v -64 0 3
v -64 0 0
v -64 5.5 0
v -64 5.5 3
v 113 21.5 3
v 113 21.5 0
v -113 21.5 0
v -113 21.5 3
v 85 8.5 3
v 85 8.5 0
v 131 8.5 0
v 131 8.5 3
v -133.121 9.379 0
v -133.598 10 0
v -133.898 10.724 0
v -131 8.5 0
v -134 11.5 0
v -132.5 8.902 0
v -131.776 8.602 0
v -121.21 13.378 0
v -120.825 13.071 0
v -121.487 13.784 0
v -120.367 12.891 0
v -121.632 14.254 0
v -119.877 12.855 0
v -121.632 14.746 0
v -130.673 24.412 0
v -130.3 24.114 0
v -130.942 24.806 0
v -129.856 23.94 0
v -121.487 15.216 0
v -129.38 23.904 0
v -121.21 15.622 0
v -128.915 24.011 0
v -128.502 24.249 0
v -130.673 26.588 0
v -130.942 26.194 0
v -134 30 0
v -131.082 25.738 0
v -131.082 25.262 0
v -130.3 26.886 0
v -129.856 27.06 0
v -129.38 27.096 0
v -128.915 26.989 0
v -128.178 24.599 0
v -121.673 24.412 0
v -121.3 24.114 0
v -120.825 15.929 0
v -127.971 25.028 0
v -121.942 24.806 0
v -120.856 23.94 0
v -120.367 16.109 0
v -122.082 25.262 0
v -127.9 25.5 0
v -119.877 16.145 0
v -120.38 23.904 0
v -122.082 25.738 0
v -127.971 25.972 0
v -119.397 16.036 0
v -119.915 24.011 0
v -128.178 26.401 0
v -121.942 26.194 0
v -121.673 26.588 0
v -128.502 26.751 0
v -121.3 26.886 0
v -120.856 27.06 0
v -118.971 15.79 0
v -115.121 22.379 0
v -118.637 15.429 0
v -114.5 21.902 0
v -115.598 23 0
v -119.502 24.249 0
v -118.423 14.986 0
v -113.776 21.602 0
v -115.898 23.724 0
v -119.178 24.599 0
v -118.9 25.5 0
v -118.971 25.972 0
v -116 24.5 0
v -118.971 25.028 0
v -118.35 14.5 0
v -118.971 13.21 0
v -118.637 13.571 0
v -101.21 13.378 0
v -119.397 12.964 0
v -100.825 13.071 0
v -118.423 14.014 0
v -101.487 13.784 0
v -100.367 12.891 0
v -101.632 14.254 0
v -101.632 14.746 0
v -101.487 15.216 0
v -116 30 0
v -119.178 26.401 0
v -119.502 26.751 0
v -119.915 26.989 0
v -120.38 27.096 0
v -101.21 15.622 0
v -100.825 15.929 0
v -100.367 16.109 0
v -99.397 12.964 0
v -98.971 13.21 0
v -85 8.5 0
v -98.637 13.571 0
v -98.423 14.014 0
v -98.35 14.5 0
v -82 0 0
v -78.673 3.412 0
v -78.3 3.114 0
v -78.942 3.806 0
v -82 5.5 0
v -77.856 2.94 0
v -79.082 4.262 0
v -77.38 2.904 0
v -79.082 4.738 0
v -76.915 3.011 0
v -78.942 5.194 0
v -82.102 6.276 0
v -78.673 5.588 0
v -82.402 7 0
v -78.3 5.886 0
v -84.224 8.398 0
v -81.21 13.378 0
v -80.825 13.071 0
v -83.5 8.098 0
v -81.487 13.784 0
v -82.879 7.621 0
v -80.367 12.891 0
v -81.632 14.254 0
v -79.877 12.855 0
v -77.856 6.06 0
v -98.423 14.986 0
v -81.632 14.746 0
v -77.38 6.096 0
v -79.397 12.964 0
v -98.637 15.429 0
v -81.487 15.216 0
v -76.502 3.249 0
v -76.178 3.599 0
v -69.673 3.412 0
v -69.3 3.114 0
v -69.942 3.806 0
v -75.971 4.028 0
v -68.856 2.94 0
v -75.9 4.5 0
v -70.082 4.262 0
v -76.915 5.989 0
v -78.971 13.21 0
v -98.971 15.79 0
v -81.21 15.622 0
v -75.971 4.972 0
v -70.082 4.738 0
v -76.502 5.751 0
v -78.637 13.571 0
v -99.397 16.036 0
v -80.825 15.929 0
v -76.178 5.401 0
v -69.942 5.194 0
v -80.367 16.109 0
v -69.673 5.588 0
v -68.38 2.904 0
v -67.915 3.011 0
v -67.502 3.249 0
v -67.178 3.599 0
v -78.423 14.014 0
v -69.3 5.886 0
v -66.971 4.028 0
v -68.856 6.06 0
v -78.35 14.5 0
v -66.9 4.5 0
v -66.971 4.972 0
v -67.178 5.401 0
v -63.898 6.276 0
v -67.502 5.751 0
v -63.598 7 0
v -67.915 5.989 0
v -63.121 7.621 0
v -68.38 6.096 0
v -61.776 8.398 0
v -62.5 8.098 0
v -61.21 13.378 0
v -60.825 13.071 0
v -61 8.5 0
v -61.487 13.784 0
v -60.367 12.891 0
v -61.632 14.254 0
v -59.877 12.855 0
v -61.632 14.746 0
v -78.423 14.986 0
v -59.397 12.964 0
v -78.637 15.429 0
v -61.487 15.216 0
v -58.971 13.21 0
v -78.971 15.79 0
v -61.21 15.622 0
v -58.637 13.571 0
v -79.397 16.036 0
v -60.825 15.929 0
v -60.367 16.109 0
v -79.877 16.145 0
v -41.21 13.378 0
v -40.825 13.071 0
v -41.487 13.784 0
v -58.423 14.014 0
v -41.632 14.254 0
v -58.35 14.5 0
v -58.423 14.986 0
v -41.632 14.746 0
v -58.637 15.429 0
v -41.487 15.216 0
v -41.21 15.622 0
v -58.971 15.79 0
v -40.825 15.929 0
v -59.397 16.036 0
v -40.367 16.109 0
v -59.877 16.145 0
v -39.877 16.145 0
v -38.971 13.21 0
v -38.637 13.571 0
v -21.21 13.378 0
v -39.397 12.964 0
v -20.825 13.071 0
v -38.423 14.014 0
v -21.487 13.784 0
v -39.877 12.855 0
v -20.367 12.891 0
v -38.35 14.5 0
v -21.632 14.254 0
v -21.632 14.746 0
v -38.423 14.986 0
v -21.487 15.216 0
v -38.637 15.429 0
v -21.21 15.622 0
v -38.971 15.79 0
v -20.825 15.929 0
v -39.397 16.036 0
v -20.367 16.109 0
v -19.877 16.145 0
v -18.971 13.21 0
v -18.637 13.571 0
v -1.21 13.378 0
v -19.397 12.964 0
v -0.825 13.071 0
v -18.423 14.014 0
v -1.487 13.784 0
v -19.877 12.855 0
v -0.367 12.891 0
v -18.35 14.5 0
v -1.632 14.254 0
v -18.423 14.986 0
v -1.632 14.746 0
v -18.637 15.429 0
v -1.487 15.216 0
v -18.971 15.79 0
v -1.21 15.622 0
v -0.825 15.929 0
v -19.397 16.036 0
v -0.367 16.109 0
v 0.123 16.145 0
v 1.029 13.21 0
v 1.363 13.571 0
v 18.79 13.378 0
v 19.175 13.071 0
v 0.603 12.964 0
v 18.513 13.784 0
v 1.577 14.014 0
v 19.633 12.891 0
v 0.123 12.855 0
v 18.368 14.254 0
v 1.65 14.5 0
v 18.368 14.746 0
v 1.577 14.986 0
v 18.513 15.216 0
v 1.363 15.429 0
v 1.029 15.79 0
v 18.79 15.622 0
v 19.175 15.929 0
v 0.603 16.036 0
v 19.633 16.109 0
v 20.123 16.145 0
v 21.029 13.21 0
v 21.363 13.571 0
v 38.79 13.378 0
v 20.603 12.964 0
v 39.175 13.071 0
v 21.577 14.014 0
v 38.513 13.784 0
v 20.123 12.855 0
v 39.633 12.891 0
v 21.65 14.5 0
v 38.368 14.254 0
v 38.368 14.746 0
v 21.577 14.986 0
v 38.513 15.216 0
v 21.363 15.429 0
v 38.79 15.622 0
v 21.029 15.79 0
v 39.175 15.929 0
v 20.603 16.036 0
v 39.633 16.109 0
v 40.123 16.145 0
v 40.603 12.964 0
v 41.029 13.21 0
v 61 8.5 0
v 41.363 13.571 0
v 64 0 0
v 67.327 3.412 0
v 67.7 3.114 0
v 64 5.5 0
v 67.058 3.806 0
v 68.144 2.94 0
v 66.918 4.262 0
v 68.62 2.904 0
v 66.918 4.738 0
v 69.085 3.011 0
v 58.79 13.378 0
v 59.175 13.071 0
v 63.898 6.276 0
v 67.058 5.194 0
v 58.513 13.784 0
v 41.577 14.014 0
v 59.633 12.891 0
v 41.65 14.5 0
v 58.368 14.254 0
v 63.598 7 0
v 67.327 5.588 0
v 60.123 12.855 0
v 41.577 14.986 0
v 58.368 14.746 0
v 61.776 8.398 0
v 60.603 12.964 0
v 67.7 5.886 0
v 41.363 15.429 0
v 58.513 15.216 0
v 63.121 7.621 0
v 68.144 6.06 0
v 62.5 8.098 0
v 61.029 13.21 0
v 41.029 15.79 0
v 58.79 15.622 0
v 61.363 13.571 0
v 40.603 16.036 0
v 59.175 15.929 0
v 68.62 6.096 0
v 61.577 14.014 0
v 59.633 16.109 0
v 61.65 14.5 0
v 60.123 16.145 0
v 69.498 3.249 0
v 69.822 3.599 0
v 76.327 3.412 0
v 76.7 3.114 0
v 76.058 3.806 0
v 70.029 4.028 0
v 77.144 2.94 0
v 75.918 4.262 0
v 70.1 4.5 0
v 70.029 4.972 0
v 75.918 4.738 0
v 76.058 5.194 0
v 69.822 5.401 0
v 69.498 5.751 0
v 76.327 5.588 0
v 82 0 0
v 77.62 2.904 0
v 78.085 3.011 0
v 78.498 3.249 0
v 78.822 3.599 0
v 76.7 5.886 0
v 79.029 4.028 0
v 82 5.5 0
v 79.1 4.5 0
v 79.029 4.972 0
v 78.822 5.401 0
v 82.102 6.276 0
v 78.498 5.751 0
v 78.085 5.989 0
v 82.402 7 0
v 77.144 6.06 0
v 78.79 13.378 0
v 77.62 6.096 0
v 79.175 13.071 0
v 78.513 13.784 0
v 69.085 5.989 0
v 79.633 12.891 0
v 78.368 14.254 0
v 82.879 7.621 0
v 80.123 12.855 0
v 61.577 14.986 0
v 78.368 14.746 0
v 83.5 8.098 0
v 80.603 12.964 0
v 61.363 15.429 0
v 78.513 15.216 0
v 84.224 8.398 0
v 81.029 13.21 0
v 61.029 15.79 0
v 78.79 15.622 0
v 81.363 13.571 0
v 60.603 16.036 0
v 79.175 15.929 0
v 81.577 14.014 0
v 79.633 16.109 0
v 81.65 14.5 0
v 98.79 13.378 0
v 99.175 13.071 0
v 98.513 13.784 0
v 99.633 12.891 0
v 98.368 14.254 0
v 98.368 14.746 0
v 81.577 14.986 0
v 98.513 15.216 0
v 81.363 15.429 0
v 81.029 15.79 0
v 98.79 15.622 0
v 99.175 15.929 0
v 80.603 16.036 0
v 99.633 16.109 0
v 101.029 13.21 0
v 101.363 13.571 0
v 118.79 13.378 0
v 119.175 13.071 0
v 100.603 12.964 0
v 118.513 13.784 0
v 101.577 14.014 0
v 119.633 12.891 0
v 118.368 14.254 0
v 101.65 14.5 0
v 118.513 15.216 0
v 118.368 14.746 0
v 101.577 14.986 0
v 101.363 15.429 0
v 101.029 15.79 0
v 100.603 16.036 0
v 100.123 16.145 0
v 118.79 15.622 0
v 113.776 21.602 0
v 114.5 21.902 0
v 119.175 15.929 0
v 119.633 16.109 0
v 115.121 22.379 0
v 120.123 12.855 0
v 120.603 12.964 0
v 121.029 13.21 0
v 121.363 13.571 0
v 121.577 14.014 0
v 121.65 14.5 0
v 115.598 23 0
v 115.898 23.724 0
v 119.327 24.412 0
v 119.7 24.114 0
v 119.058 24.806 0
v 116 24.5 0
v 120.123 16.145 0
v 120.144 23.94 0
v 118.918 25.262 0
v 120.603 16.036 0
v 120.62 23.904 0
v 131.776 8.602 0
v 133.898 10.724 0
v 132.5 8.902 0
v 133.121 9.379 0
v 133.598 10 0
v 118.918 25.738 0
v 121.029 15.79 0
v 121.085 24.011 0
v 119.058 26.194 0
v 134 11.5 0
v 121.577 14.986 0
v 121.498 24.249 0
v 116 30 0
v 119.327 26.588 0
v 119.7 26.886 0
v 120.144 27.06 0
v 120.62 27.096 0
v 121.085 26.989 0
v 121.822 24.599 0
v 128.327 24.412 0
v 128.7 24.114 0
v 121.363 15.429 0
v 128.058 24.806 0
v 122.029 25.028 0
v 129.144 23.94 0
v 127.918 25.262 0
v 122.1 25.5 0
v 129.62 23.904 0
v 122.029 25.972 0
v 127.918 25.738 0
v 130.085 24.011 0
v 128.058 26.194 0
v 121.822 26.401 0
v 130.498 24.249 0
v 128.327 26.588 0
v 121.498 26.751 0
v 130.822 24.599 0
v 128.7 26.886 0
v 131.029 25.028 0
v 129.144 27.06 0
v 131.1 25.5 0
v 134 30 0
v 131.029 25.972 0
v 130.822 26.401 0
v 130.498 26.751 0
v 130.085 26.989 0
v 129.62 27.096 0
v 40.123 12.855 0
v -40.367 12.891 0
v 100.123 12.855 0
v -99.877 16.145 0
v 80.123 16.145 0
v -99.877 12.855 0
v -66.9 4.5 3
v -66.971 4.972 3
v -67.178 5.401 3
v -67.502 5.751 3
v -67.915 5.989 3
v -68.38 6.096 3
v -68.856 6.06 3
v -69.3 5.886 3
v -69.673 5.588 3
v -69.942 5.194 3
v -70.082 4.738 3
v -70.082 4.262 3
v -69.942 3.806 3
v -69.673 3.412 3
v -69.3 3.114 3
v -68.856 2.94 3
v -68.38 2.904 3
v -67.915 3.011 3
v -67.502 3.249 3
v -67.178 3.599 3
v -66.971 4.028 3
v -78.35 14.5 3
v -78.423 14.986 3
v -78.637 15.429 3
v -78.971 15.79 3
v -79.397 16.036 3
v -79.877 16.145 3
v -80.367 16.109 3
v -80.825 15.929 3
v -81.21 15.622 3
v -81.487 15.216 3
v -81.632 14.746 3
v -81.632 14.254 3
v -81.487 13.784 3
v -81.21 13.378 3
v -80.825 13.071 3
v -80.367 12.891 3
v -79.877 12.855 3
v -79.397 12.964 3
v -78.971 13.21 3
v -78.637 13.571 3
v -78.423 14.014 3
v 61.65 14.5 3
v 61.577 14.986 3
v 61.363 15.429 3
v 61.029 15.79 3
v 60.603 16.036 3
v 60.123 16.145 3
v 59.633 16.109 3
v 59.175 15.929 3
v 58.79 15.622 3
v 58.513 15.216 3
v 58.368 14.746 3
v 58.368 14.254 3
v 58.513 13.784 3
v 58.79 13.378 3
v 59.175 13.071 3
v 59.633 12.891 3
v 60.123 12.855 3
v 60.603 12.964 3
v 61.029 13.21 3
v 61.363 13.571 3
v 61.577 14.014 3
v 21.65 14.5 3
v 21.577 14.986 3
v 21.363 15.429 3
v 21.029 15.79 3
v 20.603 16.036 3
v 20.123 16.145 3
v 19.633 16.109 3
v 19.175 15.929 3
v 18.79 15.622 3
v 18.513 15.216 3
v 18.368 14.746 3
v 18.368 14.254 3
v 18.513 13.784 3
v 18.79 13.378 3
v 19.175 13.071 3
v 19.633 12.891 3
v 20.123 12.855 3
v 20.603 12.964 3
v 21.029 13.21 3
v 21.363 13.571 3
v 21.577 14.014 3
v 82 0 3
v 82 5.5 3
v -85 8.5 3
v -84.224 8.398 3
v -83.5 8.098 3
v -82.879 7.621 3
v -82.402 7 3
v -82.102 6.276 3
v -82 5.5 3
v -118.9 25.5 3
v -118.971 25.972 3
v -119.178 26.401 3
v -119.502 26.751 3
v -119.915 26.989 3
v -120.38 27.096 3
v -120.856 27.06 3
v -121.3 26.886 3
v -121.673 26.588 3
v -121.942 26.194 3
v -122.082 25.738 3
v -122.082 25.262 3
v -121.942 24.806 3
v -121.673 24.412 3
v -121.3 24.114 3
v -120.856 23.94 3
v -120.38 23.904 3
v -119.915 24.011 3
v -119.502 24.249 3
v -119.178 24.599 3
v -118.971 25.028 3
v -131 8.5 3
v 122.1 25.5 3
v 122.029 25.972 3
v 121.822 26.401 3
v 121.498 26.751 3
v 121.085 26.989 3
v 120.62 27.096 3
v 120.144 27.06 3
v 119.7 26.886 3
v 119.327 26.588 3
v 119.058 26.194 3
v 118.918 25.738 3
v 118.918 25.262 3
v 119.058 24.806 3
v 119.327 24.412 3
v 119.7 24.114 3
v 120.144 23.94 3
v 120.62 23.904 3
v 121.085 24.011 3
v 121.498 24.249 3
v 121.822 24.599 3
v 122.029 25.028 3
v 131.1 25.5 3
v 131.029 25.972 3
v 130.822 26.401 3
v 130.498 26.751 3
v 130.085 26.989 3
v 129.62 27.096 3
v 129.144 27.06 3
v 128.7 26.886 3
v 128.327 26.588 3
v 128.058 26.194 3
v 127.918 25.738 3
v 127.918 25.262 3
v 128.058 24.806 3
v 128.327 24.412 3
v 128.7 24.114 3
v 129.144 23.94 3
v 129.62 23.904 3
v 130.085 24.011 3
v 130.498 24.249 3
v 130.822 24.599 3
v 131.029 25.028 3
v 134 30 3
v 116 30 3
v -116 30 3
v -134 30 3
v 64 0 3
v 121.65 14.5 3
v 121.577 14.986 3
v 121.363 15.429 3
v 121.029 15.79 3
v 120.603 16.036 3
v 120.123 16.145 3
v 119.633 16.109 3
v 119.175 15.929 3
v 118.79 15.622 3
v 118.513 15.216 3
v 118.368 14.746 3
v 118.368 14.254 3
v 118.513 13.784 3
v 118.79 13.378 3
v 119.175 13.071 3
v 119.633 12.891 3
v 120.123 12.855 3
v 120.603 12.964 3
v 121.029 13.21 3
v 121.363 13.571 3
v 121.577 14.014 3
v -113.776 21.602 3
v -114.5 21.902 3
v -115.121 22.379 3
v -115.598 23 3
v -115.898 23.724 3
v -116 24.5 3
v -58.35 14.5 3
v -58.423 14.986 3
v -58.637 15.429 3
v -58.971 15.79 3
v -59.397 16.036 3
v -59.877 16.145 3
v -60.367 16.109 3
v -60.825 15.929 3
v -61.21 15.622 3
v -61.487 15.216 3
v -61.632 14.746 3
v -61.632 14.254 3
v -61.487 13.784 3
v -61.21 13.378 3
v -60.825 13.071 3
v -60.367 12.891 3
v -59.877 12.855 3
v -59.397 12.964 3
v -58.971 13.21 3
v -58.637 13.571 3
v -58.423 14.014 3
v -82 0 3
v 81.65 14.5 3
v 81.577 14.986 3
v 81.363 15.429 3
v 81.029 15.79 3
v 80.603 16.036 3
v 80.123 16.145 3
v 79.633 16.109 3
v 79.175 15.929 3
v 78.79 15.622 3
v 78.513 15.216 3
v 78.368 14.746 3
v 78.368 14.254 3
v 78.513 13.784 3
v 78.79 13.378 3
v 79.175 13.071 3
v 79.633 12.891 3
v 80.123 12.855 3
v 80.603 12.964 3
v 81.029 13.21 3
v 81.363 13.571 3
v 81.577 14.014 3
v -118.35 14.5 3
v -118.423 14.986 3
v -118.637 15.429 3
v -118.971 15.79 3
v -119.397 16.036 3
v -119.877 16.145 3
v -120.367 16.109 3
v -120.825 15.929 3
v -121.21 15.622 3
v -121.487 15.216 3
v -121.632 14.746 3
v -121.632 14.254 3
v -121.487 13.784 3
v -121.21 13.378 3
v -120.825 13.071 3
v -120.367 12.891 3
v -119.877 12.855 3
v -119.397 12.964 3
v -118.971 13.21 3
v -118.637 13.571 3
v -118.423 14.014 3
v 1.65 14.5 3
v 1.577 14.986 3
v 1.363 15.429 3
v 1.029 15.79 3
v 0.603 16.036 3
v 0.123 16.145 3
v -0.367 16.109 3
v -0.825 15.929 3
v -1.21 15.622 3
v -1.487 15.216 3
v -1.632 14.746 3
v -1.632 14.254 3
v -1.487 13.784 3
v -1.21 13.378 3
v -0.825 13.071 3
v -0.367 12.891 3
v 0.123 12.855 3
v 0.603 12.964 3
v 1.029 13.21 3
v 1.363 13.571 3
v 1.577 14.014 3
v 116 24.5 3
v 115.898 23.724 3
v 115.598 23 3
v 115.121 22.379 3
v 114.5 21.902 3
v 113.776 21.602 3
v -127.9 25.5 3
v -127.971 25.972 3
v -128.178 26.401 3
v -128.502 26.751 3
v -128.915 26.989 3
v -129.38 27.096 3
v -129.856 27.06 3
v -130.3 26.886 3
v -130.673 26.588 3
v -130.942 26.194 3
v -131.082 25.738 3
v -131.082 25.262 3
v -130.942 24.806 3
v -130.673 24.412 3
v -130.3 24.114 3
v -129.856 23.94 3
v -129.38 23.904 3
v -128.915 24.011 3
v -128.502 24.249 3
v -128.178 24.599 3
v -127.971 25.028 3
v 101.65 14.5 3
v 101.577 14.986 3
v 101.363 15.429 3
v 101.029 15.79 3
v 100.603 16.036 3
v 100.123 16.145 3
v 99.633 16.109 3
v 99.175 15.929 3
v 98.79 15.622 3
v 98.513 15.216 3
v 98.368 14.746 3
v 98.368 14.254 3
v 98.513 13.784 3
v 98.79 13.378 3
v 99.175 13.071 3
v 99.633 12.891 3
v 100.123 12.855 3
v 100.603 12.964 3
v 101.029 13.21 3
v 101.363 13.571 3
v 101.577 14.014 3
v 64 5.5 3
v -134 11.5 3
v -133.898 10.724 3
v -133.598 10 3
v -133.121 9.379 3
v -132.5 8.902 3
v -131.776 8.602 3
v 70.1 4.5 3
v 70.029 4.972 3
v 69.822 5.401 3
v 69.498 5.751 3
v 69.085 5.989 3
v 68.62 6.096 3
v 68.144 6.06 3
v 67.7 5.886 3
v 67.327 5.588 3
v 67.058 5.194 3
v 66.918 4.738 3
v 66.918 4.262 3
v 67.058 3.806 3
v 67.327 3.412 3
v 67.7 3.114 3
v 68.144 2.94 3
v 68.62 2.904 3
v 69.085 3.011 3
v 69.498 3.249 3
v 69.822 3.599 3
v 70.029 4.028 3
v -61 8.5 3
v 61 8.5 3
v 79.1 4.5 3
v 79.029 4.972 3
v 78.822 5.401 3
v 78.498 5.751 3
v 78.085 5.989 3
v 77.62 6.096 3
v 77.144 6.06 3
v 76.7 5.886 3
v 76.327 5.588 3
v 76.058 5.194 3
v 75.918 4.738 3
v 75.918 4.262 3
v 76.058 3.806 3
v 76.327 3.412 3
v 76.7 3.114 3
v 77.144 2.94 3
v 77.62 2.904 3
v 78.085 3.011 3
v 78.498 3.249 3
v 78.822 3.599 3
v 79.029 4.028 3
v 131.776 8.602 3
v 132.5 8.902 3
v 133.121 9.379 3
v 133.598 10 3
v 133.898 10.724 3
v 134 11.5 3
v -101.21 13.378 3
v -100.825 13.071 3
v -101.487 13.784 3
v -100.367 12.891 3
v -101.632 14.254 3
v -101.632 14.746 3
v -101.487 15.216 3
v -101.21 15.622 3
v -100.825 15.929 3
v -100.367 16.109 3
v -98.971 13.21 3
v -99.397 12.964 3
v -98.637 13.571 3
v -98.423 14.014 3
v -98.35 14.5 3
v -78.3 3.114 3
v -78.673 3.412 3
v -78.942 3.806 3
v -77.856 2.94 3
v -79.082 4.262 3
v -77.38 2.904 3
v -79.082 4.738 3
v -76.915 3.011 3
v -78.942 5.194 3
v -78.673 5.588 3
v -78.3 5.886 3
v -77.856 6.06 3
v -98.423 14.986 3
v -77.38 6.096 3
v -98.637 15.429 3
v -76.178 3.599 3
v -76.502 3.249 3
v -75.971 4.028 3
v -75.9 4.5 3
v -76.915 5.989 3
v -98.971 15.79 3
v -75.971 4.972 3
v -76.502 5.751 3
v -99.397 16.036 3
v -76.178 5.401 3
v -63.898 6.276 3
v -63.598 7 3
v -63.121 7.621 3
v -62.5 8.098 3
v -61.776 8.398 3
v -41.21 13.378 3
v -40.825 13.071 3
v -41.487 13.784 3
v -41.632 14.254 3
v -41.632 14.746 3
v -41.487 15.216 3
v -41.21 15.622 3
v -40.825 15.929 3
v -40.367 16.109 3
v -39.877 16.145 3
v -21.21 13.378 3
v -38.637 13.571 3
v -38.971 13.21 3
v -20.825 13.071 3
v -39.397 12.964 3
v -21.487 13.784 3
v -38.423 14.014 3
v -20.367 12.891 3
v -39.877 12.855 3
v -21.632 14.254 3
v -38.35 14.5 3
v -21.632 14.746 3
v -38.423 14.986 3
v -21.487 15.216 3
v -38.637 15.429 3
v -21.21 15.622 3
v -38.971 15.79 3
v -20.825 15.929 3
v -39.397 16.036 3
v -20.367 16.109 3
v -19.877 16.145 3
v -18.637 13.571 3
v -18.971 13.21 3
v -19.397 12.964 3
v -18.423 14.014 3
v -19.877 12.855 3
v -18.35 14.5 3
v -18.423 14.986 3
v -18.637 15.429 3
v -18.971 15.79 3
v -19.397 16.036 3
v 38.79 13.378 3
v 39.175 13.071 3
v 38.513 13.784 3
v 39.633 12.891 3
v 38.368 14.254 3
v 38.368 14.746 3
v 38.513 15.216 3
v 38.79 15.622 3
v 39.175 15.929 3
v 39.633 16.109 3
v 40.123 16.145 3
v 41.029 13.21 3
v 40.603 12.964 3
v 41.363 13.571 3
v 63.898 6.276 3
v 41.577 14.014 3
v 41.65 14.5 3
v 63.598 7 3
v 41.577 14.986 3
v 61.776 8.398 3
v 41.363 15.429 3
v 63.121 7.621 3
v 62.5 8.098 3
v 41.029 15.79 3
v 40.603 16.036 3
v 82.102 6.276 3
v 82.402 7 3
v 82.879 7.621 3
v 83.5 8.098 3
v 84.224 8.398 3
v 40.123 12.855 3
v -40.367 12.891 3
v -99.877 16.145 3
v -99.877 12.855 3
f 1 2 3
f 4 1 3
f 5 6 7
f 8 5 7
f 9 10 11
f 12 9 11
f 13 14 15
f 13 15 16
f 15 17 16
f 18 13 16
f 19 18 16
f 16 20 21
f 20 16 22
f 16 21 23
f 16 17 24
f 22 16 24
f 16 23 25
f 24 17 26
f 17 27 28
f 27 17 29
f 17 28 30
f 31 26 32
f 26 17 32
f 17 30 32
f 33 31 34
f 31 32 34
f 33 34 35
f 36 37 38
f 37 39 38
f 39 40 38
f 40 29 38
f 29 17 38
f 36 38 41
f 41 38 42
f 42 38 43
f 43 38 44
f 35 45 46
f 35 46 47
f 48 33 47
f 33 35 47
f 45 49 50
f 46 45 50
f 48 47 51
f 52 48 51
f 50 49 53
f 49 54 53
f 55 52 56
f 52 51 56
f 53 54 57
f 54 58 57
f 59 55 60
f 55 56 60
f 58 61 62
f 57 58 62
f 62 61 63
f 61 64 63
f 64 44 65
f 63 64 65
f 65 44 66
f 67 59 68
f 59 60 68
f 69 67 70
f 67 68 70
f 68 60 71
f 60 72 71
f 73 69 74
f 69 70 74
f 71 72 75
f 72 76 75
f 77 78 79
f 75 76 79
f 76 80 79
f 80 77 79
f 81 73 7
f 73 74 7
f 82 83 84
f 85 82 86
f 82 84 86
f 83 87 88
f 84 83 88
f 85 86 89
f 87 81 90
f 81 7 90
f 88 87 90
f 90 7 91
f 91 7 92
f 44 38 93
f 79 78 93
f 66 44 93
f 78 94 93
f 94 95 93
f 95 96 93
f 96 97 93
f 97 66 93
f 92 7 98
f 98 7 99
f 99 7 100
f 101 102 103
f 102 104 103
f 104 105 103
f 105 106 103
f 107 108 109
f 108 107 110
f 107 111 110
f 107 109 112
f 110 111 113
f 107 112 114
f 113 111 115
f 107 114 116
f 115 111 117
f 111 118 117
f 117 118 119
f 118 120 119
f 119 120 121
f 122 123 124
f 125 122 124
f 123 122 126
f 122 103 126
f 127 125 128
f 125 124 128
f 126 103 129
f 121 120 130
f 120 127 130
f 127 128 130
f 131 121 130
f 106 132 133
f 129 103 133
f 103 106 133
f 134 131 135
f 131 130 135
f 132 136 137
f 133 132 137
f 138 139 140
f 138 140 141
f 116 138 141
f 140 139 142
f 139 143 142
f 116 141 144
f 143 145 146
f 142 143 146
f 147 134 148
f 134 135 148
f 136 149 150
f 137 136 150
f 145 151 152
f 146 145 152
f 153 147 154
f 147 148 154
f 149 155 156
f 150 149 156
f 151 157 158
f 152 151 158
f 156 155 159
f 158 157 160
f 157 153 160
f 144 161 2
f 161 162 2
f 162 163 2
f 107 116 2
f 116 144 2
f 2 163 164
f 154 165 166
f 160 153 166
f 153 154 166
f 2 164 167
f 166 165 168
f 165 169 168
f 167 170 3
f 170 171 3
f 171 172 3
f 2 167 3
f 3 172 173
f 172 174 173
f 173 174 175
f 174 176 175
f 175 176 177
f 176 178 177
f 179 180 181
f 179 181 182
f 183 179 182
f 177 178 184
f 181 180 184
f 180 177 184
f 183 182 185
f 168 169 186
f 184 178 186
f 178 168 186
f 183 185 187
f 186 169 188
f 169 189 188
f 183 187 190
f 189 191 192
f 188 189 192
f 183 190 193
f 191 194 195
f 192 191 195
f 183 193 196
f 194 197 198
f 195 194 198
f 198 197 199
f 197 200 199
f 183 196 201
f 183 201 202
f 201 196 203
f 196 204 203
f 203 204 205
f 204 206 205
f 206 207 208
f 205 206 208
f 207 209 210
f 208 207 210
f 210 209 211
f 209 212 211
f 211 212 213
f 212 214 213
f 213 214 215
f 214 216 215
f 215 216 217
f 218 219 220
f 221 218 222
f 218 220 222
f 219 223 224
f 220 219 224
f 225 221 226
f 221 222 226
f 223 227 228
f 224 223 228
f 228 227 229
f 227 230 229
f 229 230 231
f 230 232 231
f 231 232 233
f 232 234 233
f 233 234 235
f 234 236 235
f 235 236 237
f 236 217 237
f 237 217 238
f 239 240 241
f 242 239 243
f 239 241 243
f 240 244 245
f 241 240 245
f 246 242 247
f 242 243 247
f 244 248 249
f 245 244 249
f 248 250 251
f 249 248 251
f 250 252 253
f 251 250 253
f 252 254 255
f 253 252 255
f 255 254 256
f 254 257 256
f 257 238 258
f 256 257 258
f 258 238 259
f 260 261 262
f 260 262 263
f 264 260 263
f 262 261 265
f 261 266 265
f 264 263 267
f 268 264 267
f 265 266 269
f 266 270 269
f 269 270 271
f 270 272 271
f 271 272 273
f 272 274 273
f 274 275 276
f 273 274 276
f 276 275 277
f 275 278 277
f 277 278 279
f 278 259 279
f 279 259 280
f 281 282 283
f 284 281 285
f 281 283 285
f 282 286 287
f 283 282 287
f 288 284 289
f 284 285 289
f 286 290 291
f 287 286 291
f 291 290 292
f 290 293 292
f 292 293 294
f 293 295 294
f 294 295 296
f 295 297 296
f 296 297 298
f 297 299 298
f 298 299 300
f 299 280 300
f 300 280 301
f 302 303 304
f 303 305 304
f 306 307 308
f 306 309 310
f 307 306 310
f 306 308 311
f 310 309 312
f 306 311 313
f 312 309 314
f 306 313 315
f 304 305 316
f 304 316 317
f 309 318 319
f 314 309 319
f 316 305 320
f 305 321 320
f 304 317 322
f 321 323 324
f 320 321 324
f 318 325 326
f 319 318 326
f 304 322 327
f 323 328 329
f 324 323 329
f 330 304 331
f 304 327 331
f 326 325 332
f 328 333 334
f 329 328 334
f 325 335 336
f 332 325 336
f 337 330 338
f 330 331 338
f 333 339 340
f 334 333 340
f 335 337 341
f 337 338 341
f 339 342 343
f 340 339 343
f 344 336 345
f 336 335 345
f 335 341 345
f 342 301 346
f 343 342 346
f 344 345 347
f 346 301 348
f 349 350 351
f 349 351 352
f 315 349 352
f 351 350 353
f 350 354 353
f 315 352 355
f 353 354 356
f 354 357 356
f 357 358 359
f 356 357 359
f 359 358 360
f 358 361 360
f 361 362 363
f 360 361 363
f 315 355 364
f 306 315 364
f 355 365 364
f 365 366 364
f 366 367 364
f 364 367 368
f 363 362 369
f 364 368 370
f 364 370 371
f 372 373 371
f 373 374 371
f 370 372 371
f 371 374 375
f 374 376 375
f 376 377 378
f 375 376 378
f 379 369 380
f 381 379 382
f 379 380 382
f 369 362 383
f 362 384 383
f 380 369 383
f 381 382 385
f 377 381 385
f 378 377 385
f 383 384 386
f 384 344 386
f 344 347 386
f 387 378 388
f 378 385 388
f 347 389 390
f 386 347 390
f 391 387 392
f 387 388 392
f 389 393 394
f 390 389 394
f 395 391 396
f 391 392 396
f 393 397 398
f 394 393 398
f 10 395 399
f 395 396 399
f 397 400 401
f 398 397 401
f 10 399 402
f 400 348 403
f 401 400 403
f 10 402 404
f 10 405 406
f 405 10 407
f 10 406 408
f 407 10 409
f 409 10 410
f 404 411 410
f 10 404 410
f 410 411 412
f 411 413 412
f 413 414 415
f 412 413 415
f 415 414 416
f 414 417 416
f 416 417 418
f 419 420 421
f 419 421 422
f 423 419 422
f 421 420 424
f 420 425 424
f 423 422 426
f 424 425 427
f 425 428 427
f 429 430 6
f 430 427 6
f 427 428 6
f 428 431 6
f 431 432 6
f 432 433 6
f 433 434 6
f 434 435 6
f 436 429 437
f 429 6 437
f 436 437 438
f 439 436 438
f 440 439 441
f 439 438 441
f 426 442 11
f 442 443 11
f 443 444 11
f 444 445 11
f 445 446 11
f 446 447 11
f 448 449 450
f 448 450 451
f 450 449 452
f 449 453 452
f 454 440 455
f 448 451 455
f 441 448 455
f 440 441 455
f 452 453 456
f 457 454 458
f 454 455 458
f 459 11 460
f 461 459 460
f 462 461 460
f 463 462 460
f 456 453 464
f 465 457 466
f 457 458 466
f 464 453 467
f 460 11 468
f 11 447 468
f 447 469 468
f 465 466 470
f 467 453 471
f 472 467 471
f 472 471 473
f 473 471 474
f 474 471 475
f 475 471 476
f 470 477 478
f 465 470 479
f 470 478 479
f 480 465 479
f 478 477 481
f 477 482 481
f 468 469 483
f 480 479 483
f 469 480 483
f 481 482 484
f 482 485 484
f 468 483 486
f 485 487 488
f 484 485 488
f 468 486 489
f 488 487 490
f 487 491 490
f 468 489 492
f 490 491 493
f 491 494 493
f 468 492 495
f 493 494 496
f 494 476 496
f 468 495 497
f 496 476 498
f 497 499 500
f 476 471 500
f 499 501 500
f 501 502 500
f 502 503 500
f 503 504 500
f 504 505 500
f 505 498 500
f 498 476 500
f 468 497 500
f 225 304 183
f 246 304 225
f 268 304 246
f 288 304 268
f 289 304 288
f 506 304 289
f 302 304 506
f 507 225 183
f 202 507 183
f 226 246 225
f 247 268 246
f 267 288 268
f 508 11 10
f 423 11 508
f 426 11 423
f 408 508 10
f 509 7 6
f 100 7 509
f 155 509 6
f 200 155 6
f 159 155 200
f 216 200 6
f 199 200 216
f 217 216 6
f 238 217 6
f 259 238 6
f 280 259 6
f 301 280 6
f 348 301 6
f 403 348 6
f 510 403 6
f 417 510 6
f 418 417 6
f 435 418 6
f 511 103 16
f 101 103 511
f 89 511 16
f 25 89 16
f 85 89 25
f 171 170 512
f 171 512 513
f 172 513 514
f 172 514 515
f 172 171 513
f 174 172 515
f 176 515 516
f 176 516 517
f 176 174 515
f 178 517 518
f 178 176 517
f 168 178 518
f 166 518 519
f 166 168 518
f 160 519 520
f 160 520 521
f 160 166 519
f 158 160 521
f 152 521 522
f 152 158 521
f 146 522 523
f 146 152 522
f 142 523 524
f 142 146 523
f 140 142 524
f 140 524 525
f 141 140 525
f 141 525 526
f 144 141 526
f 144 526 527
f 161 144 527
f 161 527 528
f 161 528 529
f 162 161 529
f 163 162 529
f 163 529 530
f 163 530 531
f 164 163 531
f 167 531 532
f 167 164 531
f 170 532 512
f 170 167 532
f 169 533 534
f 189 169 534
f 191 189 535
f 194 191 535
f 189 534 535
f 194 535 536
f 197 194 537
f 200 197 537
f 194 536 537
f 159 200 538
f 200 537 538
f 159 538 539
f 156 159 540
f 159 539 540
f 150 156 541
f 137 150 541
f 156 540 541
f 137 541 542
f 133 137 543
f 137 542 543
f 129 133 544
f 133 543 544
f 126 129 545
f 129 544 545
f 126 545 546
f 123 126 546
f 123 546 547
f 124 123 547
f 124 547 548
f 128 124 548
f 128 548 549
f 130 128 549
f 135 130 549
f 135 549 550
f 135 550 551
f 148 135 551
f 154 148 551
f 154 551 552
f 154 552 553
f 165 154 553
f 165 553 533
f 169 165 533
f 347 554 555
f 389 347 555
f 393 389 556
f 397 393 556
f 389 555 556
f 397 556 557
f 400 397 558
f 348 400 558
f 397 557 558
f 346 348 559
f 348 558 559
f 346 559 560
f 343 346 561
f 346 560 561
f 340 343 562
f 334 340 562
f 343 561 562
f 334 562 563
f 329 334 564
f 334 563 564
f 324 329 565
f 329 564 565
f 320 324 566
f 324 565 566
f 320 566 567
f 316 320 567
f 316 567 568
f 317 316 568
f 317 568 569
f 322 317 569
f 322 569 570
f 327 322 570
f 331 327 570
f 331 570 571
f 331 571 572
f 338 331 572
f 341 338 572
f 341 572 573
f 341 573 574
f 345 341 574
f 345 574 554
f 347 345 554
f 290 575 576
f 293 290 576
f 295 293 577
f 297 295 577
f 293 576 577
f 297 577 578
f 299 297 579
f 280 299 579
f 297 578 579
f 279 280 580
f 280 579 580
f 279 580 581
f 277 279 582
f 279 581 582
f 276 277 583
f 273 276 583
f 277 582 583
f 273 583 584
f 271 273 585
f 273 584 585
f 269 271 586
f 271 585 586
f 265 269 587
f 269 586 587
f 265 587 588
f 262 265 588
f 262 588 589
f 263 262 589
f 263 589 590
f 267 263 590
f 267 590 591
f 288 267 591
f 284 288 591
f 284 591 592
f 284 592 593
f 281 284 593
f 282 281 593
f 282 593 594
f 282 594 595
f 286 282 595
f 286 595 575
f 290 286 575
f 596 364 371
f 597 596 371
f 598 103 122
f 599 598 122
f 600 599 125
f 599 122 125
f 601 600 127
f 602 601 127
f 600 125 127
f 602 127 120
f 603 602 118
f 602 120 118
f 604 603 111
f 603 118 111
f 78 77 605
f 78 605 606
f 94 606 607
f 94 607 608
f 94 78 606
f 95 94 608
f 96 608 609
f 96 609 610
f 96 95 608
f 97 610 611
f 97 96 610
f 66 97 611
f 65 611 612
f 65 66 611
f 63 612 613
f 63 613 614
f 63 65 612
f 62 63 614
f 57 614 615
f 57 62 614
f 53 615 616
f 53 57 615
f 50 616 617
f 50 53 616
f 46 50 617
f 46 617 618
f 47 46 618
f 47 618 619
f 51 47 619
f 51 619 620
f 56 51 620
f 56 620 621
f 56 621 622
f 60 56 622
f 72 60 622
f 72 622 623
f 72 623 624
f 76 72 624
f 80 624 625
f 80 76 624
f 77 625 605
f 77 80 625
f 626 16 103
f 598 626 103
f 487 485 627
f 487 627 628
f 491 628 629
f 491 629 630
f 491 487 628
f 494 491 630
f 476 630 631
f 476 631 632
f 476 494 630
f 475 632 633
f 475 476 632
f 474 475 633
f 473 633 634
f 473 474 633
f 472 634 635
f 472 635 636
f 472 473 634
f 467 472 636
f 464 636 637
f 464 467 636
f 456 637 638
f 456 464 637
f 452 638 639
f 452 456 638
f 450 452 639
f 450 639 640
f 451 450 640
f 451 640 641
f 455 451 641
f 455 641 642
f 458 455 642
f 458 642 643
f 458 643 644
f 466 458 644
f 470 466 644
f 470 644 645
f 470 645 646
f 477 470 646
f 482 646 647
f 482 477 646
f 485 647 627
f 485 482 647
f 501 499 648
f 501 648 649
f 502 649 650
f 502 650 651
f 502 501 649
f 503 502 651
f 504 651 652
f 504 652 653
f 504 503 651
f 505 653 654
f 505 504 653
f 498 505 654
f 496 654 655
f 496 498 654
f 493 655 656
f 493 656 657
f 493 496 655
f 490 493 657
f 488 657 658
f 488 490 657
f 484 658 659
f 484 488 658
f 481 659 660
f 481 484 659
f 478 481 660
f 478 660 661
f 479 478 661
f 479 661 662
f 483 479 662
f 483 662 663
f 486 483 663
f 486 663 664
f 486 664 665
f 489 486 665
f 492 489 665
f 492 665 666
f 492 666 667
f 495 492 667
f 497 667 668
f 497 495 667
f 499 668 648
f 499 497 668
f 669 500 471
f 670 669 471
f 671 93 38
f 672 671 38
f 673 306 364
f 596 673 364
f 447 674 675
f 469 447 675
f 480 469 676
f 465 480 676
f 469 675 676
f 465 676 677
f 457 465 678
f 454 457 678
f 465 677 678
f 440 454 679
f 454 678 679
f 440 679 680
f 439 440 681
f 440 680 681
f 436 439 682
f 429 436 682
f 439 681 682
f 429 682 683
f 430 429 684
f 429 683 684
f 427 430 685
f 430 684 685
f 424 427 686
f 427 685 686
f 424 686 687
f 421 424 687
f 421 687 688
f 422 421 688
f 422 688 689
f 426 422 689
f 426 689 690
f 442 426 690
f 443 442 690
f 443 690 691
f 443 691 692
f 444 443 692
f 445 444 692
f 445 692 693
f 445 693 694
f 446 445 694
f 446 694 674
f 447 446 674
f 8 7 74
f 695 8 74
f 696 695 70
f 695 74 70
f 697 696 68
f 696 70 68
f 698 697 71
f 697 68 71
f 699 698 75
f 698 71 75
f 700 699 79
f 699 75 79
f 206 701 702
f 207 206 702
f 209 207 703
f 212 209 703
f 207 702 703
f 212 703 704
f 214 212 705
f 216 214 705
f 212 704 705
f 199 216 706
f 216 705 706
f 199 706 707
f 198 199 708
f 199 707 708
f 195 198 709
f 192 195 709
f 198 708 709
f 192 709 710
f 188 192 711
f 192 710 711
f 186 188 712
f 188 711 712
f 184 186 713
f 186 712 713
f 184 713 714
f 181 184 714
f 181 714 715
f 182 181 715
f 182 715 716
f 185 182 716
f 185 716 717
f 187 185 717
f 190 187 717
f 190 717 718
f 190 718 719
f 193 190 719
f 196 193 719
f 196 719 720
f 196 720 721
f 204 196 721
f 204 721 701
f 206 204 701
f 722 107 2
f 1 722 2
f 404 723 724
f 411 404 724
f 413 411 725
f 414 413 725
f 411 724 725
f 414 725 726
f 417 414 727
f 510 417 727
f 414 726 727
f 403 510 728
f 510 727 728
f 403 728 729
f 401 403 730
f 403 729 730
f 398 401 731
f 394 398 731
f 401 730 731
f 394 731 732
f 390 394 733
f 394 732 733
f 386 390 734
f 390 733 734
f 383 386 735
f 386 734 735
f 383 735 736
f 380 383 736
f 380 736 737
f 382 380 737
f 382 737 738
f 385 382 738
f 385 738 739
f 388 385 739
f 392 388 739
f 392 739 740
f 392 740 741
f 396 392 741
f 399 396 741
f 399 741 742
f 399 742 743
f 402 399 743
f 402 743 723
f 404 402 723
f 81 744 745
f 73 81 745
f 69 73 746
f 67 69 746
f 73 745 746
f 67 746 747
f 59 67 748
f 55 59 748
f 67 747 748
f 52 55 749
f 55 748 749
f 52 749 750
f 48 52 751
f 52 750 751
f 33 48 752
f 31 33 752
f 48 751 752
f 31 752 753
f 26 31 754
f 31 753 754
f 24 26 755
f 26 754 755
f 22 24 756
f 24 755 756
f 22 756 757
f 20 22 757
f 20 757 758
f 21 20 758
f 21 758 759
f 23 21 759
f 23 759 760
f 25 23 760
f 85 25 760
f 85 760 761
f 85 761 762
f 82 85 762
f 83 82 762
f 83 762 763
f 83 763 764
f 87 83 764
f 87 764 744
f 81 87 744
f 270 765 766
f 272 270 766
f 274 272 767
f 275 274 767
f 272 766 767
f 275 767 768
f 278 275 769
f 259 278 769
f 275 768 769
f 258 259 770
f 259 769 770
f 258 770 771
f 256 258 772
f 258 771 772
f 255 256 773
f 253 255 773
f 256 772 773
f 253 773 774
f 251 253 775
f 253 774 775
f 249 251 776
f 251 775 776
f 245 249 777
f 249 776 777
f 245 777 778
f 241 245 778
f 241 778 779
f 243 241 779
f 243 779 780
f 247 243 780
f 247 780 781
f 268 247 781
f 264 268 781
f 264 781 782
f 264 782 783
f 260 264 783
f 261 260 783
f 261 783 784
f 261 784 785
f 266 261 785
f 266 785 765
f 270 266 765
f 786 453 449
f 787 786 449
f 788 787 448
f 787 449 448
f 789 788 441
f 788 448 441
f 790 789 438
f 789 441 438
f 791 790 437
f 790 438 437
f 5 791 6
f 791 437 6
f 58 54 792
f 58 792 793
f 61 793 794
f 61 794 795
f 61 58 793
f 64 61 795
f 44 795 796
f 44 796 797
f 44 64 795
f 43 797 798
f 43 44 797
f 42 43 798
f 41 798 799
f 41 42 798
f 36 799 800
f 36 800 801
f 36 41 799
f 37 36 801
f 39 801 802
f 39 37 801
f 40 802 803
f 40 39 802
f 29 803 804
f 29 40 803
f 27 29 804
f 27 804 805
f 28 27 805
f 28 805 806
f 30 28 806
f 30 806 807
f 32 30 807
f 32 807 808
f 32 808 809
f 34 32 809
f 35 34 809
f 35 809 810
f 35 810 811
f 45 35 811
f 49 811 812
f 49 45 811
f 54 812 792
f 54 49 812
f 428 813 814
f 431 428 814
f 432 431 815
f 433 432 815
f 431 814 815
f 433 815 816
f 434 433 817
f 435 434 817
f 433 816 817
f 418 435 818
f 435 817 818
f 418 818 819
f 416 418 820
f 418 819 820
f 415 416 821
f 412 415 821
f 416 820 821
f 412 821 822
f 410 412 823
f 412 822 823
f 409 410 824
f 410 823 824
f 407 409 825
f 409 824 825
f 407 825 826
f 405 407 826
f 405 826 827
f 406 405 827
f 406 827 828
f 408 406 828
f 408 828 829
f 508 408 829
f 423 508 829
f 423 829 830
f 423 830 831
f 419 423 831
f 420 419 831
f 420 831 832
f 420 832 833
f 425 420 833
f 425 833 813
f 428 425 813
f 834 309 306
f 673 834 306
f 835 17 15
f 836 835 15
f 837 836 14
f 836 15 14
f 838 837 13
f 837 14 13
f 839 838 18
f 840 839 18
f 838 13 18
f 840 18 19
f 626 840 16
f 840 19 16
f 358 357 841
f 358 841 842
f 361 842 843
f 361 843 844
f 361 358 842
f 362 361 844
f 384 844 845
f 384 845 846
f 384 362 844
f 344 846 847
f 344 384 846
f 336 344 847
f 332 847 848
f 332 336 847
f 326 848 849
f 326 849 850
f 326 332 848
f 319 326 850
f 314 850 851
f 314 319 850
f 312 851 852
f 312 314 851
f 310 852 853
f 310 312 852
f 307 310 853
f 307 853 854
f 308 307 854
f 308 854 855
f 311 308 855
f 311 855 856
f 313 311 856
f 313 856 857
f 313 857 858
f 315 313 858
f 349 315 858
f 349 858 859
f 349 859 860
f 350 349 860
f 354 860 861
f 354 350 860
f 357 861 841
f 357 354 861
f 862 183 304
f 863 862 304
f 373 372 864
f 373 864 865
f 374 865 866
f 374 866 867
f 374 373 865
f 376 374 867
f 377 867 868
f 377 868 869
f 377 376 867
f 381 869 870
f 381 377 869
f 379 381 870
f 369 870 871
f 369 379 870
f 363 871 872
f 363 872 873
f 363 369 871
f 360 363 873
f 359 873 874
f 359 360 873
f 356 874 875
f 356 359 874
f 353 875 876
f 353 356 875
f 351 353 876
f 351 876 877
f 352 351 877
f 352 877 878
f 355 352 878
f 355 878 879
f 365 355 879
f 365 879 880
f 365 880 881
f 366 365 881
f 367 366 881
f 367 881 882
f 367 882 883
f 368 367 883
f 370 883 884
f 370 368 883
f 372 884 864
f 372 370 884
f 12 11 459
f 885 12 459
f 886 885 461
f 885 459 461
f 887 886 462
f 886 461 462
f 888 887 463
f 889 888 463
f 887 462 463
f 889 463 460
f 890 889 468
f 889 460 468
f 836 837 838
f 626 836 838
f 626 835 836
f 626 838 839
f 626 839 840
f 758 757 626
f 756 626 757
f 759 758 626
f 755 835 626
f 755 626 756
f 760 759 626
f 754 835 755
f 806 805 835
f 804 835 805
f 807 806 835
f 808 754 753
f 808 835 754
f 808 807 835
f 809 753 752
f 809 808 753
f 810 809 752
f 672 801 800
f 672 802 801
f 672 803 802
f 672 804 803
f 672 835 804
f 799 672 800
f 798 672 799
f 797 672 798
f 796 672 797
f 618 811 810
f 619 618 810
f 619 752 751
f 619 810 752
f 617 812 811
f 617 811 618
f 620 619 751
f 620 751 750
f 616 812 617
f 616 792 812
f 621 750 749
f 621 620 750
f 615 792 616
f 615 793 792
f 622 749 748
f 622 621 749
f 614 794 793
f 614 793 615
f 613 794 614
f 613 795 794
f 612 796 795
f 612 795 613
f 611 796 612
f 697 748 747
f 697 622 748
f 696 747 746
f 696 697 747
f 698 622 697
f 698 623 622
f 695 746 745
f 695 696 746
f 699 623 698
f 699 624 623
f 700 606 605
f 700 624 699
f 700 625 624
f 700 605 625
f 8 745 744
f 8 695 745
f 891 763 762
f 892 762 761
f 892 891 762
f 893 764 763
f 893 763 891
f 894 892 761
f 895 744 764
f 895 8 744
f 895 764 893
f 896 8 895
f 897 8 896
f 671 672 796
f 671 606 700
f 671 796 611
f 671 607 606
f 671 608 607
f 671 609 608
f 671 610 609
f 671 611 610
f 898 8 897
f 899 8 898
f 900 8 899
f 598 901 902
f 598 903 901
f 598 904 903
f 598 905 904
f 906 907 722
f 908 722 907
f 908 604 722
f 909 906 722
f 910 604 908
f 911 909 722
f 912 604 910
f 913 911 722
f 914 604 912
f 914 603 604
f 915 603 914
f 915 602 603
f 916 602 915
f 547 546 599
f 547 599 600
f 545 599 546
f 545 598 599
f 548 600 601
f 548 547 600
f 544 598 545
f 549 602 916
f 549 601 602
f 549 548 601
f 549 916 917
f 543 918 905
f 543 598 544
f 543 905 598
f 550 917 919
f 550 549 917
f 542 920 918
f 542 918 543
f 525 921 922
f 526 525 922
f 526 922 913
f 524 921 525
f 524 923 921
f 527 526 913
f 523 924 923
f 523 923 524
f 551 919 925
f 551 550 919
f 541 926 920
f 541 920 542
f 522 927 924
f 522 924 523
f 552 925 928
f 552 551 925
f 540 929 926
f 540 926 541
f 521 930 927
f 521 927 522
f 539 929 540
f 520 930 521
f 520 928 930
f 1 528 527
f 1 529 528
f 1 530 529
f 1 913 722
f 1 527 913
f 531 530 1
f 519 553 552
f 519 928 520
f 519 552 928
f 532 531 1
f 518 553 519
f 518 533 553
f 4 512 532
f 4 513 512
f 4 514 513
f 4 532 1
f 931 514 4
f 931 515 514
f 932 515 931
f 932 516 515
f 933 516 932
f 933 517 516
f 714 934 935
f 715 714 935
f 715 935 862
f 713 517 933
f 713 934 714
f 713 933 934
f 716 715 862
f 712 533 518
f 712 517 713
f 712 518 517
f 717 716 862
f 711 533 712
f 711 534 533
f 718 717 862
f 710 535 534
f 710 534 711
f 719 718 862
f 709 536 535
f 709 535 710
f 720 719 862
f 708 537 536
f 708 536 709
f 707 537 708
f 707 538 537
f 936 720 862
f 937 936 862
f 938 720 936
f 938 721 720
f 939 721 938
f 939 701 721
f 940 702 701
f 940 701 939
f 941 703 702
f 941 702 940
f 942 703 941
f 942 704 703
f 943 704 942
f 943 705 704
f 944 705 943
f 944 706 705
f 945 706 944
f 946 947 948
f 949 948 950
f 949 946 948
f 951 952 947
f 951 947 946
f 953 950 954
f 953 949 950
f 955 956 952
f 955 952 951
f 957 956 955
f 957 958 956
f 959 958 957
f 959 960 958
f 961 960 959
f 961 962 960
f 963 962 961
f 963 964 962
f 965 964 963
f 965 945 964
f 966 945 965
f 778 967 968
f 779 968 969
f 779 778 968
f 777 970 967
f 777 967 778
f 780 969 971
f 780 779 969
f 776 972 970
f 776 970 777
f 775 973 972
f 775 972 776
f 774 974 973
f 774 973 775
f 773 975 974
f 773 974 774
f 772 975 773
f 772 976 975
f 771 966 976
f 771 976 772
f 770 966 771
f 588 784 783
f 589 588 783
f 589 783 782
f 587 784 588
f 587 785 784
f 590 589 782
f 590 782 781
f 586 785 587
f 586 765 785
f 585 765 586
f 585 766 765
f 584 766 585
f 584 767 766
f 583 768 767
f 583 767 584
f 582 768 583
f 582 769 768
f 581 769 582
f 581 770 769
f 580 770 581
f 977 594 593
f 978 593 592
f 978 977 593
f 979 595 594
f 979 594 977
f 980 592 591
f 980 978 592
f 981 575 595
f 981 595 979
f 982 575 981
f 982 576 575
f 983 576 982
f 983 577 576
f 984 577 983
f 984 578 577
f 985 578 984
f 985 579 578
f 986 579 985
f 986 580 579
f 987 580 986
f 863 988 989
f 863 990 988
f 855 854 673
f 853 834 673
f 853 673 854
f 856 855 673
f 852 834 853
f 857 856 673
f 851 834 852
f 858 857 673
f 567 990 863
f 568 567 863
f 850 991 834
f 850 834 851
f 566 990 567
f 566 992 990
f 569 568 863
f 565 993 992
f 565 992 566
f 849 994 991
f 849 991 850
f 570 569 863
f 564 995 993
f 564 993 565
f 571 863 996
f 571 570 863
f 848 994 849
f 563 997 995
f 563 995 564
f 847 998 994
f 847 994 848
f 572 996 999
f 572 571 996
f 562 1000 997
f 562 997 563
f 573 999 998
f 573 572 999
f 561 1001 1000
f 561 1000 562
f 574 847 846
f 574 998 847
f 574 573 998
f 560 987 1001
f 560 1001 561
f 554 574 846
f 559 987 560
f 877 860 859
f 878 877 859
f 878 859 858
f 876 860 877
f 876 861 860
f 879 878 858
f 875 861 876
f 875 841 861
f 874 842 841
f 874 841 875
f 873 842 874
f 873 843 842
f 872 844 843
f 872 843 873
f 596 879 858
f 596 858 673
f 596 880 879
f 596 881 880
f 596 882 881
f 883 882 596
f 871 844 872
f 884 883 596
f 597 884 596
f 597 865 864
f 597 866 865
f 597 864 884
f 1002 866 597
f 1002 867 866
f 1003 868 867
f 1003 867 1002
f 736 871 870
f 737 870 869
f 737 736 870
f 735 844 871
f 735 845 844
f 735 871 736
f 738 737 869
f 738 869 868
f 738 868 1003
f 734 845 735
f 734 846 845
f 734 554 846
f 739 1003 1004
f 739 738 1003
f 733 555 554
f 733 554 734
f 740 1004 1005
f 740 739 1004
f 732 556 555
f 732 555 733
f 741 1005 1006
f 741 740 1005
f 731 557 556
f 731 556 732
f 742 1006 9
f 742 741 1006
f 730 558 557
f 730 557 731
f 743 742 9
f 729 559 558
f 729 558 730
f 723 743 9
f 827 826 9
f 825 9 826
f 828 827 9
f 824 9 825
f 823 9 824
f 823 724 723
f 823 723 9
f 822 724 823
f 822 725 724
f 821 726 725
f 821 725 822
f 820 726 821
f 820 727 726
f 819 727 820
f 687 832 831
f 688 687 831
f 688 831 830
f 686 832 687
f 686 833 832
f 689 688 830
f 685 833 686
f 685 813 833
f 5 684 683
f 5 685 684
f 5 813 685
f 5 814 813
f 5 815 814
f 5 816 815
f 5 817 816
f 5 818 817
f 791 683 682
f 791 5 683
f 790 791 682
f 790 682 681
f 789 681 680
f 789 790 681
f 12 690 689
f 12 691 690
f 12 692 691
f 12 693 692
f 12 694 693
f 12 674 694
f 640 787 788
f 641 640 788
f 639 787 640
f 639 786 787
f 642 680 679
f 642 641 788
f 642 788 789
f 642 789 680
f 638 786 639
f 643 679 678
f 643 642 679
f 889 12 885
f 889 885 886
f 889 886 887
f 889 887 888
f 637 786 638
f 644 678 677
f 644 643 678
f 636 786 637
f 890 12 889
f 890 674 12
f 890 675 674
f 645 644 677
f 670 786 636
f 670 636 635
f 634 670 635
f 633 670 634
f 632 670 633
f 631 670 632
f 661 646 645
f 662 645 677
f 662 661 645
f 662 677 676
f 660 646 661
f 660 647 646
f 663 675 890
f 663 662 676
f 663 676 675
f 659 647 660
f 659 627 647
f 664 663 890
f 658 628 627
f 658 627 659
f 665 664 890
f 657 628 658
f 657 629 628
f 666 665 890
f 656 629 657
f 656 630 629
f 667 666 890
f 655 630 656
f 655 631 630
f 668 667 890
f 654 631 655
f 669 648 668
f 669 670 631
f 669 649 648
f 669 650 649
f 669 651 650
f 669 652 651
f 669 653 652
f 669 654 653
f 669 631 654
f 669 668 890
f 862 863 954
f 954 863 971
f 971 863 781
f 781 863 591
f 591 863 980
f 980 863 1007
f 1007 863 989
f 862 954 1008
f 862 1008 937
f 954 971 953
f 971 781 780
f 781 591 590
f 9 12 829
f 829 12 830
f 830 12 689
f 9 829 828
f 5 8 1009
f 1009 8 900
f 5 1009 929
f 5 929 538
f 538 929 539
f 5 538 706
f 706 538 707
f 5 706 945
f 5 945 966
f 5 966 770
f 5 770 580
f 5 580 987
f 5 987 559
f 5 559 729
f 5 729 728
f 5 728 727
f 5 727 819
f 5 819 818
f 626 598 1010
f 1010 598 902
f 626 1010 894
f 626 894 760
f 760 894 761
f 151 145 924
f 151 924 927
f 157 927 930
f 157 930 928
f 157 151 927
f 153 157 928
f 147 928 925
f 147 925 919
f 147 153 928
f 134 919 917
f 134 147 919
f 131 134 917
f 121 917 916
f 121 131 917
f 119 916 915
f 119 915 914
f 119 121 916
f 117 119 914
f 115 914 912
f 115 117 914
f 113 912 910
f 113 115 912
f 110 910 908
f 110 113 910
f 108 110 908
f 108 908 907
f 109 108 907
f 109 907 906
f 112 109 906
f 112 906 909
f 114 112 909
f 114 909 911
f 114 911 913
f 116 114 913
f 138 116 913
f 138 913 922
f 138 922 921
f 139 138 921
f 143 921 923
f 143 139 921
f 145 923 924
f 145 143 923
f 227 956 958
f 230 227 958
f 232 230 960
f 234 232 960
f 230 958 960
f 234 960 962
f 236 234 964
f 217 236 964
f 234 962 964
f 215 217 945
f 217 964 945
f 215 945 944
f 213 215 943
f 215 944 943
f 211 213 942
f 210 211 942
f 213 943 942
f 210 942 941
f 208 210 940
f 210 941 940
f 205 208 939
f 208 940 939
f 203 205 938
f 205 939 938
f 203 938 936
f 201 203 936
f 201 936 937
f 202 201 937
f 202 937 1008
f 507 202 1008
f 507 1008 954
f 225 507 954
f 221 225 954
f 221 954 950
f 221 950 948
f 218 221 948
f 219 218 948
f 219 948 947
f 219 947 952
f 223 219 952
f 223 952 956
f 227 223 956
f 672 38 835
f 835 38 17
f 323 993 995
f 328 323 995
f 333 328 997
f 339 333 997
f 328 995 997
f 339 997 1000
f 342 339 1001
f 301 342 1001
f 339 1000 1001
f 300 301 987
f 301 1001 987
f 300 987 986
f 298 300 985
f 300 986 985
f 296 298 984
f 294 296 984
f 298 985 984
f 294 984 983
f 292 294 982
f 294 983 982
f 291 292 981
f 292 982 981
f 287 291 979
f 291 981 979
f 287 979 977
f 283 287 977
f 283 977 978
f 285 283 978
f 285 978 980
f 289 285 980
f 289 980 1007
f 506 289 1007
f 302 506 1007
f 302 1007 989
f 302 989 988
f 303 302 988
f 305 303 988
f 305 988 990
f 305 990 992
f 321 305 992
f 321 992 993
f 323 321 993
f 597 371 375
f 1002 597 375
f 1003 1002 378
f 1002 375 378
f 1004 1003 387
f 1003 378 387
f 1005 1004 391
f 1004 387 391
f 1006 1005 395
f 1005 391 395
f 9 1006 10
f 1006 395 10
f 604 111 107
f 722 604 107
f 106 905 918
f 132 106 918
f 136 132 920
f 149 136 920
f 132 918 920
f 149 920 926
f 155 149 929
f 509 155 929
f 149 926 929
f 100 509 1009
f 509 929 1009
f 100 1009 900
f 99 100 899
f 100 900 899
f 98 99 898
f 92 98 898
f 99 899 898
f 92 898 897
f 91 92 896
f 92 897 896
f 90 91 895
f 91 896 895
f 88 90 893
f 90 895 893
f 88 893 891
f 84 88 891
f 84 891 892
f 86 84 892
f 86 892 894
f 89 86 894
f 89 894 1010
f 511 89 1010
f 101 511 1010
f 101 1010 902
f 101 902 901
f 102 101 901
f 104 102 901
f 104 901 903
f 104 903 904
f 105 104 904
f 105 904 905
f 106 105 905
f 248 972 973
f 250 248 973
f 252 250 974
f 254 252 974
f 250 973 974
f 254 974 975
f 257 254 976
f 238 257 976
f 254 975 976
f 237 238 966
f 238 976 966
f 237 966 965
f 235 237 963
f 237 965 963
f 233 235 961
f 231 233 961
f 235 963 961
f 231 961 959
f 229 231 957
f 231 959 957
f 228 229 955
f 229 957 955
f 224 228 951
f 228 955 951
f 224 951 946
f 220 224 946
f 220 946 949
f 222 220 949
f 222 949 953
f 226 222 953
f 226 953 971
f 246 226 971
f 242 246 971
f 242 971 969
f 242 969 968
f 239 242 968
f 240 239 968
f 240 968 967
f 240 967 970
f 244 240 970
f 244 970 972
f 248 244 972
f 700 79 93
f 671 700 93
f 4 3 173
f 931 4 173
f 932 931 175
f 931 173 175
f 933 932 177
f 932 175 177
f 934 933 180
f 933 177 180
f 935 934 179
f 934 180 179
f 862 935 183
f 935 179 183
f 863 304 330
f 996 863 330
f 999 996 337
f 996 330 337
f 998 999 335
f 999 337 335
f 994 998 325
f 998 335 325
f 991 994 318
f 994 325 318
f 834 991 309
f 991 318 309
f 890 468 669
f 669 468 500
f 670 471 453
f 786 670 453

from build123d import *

# Parameters (mm, degrees)
SKETCH_1_R                 = 1.6
EXTRUDE_1_DEPTH            = 3
HOLE_WIZARD_2_D            = 3.3
PATTERN_LINEAR_1_COUNT     = 7
PATTERN_LINEAR_1_PITCH     = 20
PATTERN_LINEAR_1_COL_COUNT = 7
PATTERN_LINEAR_1_COL_PITCH = 20


with BuildPart() as part:
    # 草图1 → 凸台-拉伸1 (new body)
    with BuildSketch(Plane.XY):
        with BuildLine():
            Line((-61, 8.5), (61, 8.5))
            ThreePointArc((61, 8.5), (63.121320344, 7.621320344), (64, 5.5))
            Line((64, 5.5), (64, 0))
            Line((64, 0), (82, 0))
            Line((82, 0), (82, 5.5))
            ThreePointArc((82, 5.5), (82.878679656, 7.621320344), (85, 8.5))
            Line((85, 8.5), (131, 8.5))
            ThreePointArc((131, 8.5), (133.121320344, 9.378679656), (134, 11.5))
            Line((134, 11.5), (134, 30))
            Line((134, 30), (116, 30))
            Line((116, 30), (116, 24.5))
            ThreePointArc((116, 24.5), (115.121320344, 22.378679656), (113, 21.5))
            Line((113, 21.5), (-113, 21.5))
            ThreePointArc((-113, 21.5), (-115.121320344, 22.378679656), (-116, 24.5))
            Line((-116, 24.5), (-116, 30))
            Line((-116, 30), (-134, 30))
            Line((-134, 30), (-134, 11.5))
            ThreePointArc((-134, 11.5), (-133.121320344, 9.378679656), (-131, 8.5))
            Line((-131, 8.5), (-85, 8.5))
            ThreePointArc((-85, 8.5), (-82.878679656, 7.621320344), (-82, 5.5))
            Line((-82, 5.5), (-82, 0))
            Line((-82, 0), (-64, 0))
            Line((-64, 0), (-64, 5.5))
            ThreePointArc((-64, 5.5), (-63.121320344, 7.621320344), (-61, 8.5))
        make_face()
        with Locations((-77.5, 4.5)):
            Circle(SKETCH_1_R, mode=Mode.SUBTRACT)
        with Locations((-68.5, 4.5)):
            Circle(SKETCH_1_R, mode=Mode.SUBTRACT)
        with Locations((120.5, 25.5)):
            Circle(SKETCH_1_R, mode=Mode.SUBTRACT)
        with Locations((129.5, 25.5)):
            Circle(SKETCH_1_R, mode=Mode.SUBTRACT)
        with Locations((68.5, 4.5)):
            Circle(SKETCH_1_R, mode=Mode.SUBTRACT)
        with Locations((77.5, 4.5)):
            Circle(SKETCH_1_R, mode=Mode.SUBTRACT)
        with Locations((-129.5, 25.5)):
            Circle(SKETCH_1_R, mode=Mode.SUBTRACT)
        with Locations((-120.5, 25.5)):
            Circle(SKETCH_1_R, mode=Mode.SUBTRACT)
    extrude(amount=EXTRUDE_1_DEPTH)

    # 孔2 (through all)
    with Locations(Plane(origin=(0, 0, 0), x_dir=(-1, 0, 0), z_dir=(0, 0, -1))):
        with Locations((0, 14.5)):
            hole_wizard_2 = Hole(HOLE_WIZARD_2_D / 2)

    # 阵列(线性)1: 孔2 ×7
    with Locations(*[(i * PATTERN_LINEAR_1_PITCH, 0, 0) for i in range(1, PATTERN_LINEAR_1_COUNT)]):
        add(hole_wizard_2, mode=Mode.SUBTRACT)

    # 阵列(线性)1 col: 孔2 ×7
    with Locations(*[(-i * PATTERN_LINEAR_1_COL_PITCH, 0, 0) for i in range(1, PATTERN_LINEAR_1_COL_COUNT)]):
        add(hole_wizard_2, mode=Mode.SUBTRACT)


solid = part.part
